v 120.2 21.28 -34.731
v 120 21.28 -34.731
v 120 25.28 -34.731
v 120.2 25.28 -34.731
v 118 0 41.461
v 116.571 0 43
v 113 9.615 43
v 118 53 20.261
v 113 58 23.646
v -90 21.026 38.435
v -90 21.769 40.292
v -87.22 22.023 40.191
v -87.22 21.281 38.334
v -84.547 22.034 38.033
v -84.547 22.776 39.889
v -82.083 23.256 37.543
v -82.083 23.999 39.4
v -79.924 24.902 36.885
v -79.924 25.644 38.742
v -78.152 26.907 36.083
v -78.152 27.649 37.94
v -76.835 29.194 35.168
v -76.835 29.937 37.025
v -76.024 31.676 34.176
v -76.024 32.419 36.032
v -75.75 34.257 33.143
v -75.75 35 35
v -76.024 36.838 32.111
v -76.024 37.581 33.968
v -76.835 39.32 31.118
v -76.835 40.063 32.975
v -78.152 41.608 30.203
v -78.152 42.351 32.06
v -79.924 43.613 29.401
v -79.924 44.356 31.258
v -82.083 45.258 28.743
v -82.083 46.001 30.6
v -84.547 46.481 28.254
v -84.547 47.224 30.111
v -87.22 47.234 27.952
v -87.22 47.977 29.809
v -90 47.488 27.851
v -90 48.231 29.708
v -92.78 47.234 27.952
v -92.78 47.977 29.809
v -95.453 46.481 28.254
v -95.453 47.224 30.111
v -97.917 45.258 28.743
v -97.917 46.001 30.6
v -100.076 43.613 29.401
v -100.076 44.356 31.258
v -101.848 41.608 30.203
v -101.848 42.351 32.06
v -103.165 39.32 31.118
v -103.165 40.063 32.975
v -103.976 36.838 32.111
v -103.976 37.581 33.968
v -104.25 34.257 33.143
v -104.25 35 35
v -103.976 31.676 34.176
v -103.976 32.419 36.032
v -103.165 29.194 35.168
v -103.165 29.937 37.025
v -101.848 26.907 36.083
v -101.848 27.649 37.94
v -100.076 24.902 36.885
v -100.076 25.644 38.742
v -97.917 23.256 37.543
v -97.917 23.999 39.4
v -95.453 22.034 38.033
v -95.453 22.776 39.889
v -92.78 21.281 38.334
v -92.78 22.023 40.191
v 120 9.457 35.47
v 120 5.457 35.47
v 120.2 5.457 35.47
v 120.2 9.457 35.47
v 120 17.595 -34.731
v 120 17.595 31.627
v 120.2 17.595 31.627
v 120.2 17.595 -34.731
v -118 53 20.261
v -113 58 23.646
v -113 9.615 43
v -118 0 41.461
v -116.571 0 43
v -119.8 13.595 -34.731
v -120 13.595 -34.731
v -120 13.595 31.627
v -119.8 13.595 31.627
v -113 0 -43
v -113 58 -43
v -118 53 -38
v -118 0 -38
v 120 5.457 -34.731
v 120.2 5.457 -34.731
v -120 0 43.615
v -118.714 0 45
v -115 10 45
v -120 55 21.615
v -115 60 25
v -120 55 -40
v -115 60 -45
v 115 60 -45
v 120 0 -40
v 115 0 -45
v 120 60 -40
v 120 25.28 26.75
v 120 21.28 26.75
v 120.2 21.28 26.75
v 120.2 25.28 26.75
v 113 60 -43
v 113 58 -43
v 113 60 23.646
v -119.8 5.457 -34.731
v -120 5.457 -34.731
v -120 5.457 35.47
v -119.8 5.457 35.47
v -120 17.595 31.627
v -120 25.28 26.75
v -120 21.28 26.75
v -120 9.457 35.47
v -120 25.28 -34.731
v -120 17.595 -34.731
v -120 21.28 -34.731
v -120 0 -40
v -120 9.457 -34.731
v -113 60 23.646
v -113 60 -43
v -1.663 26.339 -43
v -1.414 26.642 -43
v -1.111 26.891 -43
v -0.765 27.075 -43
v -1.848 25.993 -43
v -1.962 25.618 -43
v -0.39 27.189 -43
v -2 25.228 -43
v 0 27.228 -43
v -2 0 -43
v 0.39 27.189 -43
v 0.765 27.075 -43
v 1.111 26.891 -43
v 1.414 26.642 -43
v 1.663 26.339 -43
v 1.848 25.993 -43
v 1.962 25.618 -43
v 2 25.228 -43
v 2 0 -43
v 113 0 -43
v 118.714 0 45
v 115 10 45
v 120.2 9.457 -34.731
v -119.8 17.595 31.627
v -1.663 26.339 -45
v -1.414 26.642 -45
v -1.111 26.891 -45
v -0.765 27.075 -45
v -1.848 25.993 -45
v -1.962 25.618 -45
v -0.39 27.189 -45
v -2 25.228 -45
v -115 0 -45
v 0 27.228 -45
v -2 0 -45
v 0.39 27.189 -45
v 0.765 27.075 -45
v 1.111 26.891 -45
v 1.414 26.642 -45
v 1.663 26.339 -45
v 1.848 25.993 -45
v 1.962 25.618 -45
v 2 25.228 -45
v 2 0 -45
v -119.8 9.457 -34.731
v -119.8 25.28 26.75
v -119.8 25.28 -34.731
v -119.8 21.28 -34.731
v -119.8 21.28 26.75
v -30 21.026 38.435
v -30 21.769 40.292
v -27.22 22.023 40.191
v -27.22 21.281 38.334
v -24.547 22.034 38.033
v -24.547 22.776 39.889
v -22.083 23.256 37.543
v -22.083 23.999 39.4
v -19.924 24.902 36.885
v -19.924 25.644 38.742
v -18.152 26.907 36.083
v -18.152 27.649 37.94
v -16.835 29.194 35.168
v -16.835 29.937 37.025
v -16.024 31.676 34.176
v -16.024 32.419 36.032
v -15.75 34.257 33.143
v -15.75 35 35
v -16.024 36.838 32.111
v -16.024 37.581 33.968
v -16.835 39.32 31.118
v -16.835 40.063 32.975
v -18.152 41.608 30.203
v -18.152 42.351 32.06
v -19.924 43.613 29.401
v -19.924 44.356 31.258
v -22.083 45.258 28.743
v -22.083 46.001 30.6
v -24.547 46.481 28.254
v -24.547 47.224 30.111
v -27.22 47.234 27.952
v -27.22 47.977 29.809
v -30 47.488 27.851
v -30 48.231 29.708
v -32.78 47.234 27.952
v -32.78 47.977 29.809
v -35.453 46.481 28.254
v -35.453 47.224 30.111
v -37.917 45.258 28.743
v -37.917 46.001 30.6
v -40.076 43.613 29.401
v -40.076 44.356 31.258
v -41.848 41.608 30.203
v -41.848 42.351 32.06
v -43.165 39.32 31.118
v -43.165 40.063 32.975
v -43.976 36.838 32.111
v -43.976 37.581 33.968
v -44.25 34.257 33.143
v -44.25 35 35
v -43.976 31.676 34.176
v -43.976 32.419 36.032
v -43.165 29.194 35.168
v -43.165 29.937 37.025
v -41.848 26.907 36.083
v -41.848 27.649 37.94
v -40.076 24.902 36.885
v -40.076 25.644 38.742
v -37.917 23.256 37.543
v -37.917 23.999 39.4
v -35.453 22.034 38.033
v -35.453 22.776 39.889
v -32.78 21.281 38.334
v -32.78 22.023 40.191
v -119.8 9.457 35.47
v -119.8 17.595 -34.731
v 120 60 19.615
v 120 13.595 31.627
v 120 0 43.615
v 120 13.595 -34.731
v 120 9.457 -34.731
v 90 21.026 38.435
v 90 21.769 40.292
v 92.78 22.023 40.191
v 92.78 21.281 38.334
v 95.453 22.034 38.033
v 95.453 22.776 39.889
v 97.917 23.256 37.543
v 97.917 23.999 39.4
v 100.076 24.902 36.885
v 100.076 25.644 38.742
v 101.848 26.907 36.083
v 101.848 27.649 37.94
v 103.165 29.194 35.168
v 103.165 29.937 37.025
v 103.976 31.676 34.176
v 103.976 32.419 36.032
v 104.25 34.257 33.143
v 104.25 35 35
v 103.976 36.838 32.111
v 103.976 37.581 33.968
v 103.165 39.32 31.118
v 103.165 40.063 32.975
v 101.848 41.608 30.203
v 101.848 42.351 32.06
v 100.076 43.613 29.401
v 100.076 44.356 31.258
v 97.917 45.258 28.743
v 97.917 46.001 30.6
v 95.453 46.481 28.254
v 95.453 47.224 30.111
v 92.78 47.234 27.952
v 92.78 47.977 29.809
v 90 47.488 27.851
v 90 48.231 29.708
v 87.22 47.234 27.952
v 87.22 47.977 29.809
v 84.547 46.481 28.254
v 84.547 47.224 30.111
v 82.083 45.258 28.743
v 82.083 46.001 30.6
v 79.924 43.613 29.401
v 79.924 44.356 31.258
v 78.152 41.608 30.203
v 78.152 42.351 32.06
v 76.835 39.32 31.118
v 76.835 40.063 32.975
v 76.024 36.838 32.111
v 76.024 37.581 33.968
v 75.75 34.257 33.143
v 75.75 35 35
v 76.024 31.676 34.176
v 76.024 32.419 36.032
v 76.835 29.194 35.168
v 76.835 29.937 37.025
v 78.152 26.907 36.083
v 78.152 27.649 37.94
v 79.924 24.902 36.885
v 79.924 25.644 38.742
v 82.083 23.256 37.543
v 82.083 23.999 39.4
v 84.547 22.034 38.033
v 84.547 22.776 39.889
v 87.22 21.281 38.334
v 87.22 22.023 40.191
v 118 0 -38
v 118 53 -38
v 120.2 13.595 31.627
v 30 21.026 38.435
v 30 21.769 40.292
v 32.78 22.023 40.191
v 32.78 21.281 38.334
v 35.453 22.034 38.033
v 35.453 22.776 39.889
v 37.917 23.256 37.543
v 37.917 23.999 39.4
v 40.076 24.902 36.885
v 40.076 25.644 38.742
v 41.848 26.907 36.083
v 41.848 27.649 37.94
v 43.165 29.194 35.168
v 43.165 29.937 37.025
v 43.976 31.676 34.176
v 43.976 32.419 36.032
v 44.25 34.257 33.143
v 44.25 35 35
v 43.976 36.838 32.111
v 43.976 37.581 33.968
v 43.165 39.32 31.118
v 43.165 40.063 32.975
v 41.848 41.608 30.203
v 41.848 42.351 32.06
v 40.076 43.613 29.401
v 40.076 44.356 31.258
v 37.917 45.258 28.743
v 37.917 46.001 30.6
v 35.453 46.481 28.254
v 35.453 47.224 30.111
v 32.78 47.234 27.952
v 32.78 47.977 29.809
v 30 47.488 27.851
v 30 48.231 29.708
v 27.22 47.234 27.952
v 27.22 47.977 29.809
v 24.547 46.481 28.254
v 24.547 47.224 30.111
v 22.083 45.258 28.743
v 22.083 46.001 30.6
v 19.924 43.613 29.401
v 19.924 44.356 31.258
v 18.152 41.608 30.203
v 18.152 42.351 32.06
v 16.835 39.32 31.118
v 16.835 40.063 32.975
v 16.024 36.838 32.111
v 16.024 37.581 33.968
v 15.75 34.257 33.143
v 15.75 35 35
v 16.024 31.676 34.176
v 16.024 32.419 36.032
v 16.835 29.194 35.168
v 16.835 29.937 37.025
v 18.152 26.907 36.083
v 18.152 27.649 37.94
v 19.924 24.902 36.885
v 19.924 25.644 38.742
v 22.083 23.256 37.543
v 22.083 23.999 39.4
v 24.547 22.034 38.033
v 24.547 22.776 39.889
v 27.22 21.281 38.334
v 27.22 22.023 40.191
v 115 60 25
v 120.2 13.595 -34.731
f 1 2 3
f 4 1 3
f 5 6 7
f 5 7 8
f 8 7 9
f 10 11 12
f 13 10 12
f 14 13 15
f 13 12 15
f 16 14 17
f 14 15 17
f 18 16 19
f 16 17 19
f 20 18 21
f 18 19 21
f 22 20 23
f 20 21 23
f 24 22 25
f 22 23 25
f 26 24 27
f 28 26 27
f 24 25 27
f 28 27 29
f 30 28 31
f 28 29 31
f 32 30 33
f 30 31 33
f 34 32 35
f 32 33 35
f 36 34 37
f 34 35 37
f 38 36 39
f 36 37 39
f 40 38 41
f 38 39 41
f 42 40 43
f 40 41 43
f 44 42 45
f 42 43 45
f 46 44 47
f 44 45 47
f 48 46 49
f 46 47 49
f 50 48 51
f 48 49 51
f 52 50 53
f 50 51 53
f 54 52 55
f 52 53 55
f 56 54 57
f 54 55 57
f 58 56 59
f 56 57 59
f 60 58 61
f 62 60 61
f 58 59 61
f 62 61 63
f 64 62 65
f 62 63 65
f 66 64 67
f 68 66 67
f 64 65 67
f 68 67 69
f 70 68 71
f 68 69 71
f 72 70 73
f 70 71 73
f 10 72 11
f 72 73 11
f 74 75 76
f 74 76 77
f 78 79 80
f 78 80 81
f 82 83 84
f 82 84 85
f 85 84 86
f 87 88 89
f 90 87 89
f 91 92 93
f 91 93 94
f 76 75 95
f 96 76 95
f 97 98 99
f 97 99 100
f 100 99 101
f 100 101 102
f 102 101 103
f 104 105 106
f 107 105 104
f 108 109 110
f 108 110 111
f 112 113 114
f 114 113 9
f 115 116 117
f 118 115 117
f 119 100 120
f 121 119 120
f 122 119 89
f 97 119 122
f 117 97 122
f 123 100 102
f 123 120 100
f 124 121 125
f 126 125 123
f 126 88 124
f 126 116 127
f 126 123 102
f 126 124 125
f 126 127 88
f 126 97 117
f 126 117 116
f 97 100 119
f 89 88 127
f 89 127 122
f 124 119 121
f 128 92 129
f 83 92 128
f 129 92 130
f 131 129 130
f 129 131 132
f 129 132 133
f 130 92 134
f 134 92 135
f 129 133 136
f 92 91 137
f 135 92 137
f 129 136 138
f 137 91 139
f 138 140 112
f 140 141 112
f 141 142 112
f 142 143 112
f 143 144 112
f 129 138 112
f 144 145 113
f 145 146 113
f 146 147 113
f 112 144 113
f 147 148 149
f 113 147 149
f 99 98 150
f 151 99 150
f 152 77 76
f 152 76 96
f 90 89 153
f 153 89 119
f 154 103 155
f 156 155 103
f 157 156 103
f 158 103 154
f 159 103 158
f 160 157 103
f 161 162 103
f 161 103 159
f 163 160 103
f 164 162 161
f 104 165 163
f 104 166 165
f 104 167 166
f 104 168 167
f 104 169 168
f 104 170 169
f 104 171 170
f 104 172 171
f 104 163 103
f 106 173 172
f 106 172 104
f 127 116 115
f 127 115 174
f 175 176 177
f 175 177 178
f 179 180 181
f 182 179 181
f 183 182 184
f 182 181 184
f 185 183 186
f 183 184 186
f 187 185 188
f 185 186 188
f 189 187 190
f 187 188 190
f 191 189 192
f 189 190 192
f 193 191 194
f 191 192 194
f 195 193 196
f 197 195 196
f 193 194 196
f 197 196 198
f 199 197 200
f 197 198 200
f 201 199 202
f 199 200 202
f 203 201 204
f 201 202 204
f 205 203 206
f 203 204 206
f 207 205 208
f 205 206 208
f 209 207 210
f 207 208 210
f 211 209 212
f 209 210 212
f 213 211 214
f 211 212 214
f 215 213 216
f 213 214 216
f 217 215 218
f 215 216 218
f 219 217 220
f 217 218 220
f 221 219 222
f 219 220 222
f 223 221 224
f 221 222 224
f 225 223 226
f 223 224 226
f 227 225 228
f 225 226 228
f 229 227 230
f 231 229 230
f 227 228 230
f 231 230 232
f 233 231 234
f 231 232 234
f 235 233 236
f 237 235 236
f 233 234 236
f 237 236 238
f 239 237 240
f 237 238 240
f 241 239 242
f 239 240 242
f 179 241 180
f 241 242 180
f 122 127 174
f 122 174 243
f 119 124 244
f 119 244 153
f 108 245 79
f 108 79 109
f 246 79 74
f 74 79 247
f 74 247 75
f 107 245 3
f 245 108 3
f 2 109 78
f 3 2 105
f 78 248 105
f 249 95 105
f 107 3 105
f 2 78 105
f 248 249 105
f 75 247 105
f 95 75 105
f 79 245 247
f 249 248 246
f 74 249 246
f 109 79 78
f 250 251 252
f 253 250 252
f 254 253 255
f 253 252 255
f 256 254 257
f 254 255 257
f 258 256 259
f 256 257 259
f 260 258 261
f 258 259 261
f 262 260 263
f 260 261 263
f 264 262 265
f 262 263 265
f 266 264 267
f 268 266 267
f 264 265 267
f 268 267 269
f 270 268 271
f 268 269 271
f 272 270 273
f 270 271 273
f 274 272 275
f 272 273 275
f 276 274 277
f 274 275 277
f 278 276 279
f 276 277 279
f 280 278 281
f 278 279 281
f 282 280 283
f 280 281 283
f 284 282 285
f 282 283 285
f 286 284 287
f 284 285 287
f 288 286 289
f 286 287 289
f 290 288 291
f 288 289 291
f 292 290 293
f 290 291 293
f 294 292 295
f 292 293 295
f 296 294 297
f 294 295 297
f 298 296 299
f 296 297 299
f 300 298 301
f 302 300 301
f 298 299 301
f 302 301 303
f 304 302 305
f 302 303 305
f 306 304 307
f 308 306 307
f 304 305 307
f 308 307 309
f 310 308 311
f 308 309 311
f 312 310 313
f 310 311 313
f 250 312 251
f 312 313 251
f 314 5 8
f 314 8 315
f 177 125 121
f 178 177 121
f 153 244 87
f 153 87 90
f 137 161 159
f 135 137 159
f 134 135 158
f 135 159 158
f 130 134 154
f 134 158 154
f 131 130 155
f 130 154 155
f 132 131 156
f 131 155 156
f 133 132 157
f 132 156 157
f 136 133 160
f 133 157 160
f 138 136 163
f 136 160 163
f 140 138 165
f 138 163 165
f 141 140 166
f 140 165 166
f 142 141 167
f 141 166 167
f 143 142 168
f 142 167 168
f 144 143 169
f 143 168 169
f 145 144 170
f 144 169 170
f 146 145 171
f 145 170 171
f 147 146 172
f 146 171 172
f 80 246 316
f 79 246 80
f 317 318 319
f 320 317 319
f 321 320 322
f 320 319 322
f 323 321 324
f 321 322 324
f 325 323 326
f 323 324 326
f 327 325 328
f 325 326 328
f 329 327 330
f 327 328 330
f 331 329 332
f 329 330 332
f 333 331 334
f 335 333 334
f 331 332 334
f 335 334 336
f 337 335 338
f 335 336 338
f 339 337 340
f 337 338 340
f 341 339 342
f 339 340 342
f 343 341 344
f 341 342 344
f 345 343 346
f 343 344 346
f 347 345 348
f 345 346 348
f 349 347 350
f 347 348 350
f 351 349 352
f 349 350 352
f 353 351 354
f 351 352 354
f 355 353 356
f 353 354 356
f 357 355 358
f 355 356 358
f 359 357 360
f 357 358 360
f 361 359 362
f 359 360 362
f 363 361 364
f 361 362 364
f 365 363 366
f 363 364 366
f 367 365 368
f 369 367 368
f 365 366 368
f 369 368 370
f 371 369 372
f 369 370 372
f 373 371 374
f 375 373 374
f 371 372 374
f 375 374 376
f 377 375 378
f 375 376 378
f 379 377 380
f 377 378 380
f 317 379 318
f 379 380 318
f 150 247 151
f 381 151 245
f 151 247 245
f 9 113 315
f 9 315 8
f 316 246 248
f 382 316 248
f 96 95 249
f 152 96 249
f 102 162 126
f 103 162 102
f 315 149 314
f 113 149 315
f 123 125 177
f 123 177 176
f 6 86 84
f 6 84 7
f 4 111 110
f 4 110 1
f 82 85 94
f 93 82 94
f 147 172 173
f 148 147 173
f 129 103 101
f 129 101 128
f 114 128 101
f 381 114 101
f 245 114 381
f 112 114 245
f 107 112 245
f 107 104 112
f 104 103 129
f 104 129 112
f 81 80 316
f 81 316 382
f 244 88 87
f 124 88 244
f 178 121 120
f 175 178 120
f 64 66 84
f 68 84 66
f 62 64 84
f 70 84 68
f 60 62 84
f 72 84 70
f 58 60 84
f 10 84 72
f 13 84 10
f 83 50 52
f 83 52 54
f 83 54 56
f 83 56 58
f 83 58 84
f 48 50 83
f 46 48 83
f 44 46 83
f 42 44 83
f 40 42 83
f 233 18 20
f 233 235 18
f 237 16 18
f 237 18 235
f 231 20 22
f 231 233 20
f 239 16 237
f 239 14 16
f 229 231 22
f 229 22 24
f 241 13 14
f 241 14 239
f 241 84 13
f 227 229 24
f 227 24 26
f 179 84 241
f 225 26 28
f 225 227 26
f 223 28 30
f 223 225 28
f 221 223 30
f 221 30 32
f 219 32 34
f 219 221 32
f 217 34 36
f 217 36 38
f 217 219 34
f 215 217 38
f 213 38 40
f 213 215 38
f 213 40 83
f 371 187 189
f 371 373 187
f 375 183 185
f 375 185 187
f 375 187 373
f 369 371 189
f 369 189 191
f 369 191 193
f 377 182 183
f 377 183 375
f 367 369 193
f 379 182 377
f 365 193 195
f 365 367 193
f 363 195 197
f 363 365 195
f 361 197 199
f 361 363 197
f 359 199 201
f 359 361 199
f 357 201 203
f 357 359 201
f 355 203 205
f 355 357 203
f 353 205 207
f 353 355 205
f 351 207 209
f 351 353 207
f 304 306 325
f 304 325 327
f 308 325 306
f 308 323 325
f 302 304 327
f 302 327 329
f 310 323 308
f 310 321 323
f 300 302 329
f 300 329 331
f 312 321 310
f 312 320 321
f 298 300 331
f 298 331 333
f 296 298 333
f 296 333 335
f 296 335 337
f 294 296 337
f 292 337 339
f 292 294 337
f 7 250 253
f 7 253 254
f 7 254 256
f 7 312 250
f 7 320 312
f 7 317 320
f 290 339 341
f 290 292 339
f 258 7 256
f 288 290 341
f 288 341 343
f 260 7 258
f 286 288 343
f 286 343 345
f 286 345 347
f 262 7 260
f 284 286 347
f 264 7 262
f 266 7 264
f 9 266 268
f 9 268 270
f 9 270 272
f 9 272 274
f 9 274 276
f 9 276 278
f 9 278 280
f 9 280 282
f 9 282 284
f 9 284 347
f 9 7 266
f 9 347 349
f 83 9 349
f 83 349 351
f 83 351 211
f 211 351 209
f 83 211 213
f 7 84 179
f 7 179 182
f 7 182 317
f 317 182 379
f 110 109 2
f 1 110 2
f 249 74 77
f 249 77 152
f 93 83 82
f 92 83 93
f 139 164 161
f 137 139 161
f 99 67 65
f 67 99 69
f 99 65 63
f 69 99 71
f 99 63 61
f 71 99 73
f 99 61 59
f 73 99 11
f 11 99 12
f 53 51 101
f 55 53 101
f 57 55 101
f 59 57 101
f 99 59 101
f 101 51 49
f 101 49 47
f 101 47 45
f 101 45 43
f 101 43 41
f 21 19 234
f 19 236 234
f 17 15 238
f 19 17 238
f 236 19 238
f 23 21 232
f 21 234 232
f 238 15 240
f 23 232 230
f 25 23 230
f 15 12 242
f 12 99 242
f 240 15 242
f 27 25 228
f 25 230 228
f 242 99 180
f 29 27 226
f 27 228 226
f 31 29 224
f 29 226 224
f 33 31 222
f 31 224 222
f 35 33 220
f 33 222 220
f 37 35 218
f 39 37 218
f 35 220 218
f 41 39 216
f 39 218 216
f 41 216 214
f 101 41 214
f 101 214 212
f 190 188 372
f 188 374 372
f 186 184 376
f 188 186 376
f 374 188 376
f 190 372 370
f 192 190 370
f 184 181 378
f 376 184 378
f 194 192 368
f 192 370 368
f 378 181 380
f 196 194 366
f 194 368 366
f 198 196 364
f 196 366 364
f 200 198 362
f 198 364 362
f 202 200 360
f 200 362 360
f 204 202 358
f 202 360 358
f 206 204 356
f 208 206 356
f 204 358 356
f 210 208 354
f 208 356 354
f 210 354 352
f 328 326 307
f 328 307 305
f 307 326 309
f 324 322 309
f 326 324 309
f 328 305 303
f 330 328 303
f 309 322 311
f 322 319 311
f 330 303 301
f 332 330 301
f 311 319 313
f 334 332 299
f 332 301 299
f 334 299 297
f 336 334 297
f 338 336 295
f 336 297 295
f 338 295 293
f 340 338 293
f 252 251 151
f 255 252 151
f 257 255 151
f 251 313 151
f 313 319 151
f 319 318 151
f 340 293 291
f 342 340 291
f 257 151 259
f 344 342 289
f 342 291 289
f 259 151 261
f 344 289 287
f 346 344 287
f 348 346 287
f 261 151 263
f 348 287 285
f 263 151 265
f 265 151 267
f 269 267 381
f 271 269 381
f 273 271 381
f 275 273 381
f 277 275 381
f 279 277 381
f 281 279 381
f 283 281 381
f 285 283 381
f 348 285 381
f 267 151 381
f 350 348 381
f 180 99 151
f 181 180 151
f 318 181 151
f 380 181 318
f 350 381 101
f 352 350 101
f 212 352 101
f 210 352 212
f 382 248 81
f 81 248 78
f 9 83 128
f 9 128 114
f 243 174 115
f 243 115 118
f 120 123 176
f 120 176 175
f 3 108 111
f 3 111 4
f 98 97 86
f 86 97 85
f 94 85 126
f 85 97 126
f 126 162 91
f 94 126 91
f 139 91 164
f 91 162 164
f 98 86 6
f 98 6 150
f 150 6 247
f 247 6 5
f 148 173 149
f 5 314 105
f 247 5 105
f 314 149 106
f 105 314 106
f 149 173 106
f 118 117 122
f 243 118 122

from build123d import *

# Parameters (mm, degrees)
CROQUIS1_W              = 240
CROQUIS1_H              = 90
SALIENTE_EXTRUIR1_DEPTH = 60
CORTAR_EXTRUIR1_DEPTH   = 240
VACIADO1_T              = -2
CROQUIS3_R              = 14.25
CORTAR_EXTRUIR2_DEPTH   = 2
CHAFL_N1_SIZE           = 5
CROQUIS6_W              = 226
CROQUIS6_H              = 66.645934077
CORTAR_EXTRUIR6_DEPTH   = 2
CROQUIS4_W              = 70.201214056
CROQUIS4_H              = 4
CROQUIS4_W_2            = 66.358621287
CROQUIS4_W_3            = 61.48148431
SALIENTE_EXTRUIR4_DEPTH = 0.2
CROQUIS7_W              = 61.48148431
CROQUIS7_H              = 4
CROQUIS7_W_2            = 66.358621287
CROQUIS7_W_3            = 70.201214056
CORTAR_EXTRUIR7_DEPTH   = 0.2
CORTAR_EXTRUIR8_DEPTH   = 10


with BuildPart() as part:
    # Croquis1 → Saliente-Extruir1 (new body)
    with BuildSketch(Plane(origin=(0, 0, 0), x_dir=(1, 0, 0), z_dir=(0, 1, 0))):
        Rectangle(CROQUIS1_W, CROQUIS1_H)
    extrude(amount=SALIENTE_EXTRUIR1_DEPTH)

    # Croquis2 → Cortar-Extruir1 (cut)
    with BuildSketch(Plane(origin=(120, 0, 0), x_dir=(0, 0, -1), z_dir=(1, 0, 0))):
        Polygon((-45, 10), (-25, 60), (-45, 60), align=None)
    extrude(amount=-CORTAR_EXTRUIR1_DEPTH, mode=Mode.SUBTRACT)

    # Vaciado1
    vaciado1_openings = [part.faces().sort_by_distance(p)[0] for p in [
        (0, 0, 0),
    ]]
    offset(amount=VACIADO1_T, openings=vaciado1_openings, kind=Kind.INTERSECTION)

    # Croquis3 → Cortar-Extruir2 (cut)
    with BuildSketch(Plane(origin=(0, 16.896551724, 42.24137931), x_dir=(1, 0, 0), z_dir=(0, 0.3713906763541038, 0.9284766908852594))):
        with Locations(Location((-90, 19.498010509, 0), (0, 0, 270))):
            Circle(CROQUIS3_R)
        with Locations(Location((-30, 19.498010509, 0), (0, 0, 270))):
            Circle(CROQUIS3_R)
        with Locations(Location((30, 19.498010509, 0), (0, 0, 270))):
            Circle(CROQUIS3_R)
        with Locations(Location((90, 19.498010509, 0), (0, 0, 270))):
            Circle(CROQUIS3_R)
    extrude(amount=-CORTAR_EXTRUIR2_DEPTH, mode=Mode.SUBTRACT)

    # Chaflán1
    chafl_n1_edges = [part.edges().sort_by_distance(p)[0] for p in [
        (-120, 35, 35),
        (-118, 33.807417596, 33.322967039),
        (118, 33.807417596, 33.322967039),
        (120, 35, 35),
        (-120, 60, -10),
        (-120, 30, -45),
        (-118, 29, -43),
        (-118, 58, -9.677032961),
        (118, 58, -9.677032961),
        (120, 30, -45),
        (118, 29, -43),
    ]]
    chamfer(chafl_n1_edges, length=CHAFL_N1_SIZE)

    # Croquis6 → Cortar-Extruir6 (cut)
    with BuildSketch(Plane.XZ.offset(-58)):
        with Locations((0, -9.677032962)):
            Rectangle(CROQUIS6_W, CROQUIS6_H)
    extrude(amount=-CORTAR_EXTRUIR6_DEPTH, mode=Mode.SUBTRACT)

    # Croquis4 → Saliente-Extruir4 (add)
    with BuildSketch(Plane(origin=(120, 0, 0), x_dir=(0, 0, -1), z_dir=(1, 0, 0))):
        with Locations((-0.369480074, 7.456907887)):
            Rectangle(CROQUIS4_W, CROQUIS4_H)
        with Locations((1.551816311, 15.595084715)):
            Rectangle(CROQUIS4_W_2, CROQUIS4_H)
        with Locations((3.990384799, 23.280270254)):
            Rectangle(CROQUIS4_W_3, CROQUIS4_H)
    extrude(amount=SALIENTE_EXTRUIR4_DEPTH)

    # Croquis7 → Cortar-Extruir7 (cut)
    with BuildSketch(Plane.ZY.offset(120)):
        with Locations((-3.990384799, 23.280270254)):
            Rectangle(CROQUIS7_W, CROQUIS7_H)
        with Locations((-1.551816311, 15.595084715)):
            Rectangle(CROQUIS7_W_2, CROQUIS7_H)
        with Locations((0.369480074, 7.456907887)):
            Rectangle(CROQUIS7_W_3, CROQUIS7_H)
    extrude(amount=-CORTAR_EXTRUIR7_DEPTH, mode=Mode.SUBTRACT)

    # Croquis9 → Cortar-Extruir8 (cut)
    with BuildSketch(Plane(origin=(0, 0, -45), x_dir=(-1, 0, 0), z_dir=(0, 0, -1))):
        with BuildLine():
            Line((-2, 0), (2, 0))
            Line((2, 0), (2, 25.227603125))
            ThreePointArc((2, 25.227603125), (0, 27.227603125), (-2, 25.227603125))
            Line((-2, 25.227603125), (-2, 0))
        make_face()
    extrude(amount=-CORTAR_EXTRUIR8_DEPTH, mode=Mode.SUBTRACT)


solid = part.part
